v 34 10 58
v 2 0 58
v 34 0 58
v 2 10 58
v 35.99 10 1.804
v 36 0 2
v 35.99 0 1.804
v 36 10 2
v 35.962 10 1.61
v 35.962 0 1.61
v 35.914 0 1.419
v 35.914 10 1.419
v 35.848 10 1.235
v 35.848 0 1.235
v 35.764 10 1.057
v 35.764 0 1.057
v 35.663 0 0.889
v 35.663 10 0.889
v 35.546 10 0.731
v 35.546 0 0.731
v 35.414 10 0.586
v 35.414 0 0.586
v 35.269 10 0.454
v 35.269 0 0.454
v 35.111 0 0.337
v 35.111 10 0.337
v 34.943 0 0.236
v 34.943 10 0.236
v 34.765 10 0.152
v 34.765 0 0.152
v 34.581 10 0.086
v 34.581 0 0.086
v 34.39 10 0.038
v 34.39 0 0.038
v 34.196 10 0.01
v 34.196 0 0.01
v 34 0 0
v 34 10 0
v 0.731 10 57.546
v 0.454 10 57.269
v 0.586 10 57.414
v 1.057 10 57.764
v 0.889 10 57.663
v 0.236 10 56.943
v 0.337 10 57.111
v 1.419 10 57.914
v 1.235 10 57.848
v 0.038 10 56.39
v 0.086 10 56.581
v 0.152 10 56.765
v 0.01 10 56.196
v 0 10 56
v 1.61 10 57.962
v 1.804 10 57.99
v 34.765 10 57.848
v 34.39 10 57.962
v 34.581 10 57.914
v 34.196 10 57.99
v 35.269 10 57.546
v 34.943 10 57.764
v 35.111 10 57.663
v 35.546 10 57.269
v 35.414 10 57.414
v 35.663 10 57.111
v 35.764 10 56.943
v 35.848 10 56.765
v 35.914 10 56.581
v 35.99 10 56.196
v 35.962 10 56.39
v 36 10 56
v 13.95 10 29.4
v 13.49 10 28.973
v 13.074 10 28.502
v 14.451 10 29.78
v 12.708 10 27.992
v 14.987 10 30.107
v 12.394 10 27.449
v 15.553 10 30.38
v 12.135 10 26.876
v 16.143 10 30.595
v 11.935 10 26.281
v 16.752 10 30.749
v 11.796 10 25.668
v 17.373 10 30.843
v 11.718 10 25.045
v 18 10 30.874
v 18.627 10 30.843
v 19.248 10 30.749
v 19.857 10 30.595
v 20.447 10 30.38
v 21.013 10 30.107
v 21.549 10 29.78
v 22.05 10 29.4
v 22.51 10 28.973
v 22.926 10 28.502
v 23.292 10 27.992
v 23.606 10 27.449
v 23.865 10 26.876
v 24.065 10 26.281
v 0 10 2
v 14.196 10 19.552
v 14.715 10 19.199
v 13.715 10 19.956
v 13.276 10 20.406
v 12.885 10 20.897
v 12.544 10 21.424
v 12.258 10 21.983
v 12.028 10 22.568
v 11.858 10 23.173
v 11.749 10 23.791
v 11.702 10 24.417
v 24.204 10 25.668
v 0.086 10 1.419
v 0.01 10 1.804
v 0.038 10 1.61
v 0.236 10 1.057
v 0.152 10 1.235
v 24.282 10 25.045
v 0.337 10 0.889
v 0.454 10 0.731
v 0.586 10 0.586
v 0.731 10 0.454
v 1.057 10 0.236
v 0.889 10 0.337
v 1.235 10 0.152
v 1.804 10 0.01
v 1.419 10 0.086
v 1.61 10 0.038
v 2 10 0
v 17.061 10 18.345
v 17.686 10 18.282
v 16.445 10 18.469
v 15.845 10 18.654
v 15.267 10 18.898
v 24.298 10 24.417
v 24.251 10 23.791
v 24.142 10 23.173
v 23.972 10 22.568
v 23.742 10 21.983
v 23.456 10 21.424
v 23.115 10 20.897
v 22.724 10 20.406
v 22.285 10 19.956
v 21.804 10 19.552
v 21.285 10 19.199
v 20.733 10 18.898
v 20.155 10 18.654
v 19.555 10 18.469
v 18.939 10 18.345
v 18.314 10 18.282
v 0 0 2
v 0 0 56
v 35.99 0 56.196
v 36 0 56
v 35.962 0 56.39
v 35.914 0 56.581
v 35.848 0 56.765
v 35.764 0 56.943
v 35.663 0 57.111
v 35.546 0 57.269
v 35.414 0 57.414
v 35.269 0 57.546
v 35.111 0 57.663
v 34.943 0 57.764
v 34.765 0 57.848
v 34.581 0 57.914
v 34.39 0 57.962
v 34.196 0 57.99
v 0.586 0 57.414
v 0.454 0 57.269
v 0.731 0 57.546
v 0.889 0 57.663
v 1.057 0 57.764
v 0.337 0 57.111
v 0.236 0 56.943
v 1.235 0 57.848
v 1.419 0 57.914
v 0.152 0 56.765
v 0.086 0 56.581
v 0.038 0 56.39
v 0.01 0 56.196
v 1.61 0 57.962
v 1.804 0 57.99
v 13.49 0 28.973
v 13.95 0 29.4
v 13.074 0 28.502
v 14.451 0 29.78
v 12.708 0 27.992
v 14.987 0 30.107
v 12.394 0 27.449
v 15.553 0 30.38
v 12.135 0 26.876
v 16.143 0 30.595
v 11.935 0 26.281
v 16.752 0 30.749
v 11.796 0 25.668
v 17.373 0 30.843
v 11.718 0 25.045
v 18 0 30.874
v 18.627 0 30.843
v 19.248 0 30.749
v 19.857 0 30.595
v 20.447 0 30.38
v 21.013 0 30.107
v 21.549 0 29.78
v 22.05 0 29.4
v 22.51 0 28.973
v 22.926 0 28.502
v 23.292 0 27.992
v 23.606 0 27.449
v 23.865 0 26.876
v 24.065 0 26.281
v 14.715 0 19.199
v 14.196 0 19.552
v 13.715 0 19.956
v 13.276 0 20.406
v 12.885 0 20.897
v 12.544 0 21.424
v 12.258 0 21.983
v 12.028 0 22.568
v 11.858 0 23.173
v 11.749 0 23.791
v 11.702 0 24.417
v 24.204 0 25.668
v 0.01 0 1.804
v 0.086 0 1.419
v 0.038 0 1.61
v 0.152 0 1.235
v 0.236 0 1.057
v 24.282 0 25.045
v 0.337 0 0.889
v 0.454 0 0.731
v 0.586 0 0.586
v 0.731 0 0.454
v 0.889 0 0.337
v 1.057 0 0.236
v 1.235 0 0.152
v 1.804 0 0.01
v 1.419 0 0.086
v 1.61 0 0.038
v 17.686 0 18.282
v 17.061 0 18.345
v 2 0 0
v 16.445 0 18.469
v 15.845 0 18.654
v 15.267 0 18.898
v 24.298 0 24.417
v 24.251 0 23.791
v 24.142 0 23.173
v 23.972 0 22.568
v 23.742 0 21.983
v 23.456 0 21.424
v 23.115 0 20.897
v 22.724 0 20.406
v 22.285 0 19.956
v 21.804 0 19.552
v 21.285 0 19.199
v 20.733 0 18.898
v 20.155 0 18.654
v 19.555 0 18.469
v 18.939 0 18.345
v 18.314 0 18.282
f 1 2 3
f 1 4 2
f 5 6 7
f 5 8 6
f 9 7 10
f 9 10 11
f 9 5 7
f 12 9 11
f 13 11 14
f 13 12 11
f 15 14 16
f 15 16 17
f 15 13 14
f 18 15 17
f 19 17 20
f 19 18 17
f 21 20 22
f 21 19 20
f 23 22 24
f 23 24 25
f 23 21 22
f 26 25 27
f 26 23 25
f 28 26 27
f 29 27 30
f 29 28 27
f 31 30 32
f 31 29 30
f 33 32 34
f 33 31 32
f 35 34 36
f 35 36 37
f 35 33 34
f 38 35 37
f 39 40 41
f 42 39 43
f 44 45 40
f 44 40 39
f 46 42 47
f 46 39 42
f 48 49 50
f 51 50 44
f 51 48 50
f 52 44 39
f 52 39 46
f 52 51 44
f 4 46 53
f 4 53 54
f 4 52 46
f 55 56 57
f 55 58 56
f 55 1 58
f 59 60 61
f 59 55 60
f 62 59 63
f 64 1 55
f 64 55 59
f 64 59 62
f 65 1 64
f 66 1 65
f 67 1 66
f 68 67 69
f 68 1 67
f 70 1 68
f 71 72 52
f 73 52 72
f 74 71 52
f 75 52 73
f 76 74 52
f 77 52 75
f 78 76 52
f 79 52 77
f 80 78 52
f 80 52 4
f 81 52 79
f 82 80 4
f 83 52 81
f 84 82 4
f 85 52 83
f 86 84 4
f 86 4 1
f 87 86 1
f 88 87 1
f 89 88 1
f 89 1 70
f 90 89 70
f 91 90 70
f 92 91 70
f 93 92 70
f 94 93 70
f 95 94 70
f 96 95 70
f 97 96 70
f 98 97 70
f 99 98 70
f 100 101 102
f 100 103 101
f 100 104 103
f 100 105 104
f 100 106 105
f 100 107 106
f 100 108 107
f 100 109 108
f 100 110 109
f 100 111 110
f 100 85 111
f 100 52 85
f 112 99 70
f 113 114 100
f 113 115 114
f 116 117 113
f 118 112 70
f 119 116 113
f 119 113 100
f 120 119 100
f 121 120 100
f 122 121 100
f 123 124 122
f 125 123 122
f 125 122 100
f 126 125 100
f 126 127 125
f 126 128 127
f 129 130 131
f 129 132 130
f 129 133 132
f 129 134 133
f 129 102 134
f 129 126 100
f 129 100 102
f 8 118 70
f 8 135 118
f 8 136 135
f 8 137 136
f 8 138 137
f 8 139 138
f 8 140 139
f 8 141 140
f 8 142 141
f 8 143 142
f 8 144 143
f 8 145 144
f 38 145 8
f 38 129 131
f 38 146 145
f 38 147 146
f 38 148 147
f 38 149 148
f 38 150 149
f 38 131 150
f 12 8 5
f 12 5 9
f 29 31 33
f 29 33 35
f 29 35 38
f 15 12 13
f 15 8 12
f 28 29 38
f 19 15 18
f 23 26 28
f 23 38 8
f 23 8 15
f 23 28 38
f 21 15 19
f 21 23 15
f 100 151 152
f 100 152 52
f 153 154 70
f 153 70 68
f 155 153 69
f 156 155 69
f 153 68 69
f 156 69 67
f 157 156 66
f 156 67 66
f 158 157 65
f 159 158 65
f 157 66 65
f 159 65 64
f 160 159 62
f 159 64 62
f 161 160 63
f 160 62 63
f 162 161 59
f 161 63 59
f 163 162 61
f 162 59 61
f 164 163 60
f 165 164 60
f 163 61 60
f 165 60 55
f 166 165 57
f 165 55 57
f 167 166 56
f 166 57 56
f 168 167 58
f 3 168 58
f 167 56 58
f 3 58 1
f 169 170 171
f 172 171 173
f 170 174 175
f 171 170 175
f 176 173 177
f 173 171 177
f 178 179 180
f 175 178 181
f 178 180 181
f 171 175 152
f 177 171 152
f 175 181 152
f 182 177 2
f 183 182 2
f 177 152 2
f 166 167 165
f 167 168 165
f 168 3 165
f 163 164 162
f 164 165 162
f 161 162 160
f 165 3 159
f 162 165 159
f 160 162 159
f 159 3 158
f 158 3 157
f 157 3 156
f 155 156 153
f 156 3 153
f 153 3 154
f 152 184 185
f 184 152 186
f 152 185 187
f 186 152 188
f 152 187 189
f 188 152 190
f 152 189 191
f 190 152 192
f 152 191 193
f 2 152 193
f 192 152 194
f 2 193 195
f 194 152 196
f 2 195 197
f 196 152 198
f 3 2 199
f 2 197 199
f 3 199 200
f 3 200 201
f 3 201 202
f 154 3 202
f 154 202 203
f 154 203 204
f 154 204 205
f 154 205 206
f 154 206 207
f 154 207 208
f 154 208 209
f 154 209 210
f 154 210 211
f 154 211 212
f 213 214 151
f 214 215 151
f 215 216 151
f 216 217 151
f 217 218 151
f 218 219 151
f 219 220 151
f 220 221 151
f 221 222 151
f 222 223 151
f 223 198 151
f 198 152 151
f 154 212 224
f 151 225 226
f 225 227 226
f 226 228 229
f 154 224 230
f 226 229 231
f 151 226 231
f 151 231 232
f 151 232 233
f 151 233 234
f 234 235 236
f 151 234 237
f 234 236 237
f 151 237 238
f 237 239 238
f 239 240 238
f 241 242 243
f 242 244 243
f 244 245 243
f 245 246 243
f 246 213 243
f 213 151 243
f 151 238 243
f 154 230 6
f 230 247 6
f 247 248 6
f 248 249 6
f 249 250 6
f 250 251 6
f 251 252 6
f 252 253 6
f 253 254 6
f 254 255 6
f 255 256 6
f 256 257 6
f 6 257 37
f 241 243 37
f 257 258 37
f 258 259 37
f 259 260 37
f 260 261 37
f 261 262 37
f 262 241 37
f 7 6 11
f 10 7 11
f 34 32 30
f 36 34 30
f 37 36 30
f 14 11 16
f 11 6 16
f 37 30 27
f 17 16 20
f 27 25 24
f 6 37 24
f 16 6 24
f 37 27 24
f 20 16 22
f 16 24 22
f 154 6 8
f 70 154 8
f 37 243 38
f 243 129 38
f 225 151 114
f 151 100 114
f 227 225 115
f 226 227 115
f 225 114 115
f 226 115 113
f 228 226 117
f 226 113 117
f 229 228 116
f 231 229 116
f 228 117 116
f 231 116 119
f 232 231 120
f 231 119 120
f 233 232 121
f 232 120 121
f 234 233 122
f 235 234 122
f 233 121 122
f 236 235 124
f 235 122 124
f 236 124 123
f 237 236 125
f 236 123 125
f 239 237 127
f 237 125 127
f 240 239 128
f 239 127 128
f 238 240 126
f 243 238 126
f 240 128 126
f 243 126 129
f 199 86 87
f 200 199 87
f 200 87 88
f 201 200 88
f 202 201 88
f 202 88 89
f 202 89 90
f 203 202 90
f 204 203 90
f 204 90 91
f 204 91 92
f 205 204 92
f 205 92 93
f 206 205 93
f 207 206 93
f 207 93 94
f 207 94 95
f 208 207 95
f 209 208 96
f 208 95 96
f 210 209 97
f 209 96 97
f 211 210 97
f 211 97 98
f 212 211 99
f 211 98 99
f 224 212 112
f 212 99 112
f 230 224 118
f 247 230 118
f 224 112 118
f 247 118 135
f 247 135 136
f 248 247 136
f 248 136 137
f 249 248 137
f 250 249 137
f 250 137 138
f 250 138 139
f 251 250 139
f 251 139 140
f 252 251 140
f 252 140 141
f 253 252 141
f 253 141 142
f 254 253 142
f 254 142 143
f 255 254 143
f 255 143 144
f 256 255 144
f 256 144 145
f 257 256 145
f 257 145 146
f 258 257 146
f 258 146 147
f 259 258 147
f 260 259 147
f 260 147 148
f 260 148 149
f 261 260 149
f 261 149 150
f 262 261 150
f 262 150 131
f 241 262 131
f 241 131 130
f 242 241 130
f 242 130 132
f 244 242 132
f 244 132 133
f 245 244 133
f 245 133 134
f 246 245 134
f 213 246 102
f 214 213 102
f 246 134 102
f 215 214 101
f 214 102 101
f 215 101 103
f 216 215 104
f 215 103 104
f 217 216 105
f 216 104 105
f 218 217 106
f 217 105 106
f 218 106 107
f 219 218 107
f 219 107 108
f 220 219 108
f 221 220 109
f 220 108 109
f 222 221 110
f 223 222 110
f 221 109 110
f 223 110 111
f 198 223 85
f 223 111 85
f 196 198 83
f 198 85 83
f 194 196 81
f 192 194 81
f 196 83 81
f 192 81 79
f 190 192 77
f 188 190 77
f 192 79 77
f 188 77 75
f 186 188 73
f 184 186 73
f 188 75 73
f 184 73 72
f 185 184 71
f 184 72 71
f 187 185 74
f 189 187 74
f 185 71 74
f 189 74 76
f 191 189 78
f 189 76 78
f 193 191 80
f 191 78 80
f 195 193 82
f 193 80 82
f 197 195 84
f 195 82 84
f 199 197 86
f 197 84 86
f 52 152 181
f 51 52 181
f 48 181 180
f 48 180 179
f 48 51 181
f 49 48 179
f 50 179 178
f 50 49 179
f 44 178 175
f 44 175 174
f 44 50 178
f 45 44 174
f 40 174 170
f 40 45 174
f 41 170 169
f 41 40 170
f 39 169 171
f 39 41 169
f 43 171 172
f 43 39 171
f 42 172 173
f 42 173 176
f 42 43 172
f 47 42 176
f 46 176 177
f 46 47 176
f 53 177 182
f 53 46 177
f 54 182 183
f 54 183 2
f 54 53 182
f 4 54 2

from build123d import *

# Parameters (mm, degrees)
SKETCH_1_W                = 36
SKETCH_1_H                = 10
BLOCKEXTRUDE_DEPTH        = 58
FILLET_2_R                = 2
SKETCH_2_R                = 6.3
DRIVE_SHAFT_PASSAGE_DEPTH = 69.992753243


with BuildPart() as part:
    # 草图1 → BlockExtrude (new body)
    with BuildSketch(Plane.XY):
        with Locations((18, 5)):
            Rectangle(SKETCH_1_W, SKETCH_1_H)
    extrude(amount=BLOCKEXTRUDE_DEPTH)

    # Fillet 2
    fillet_2_edges = [part.edges().sort_by_distance(p)[0] for p in [
        (36, 5, 58),
        (0, 5, 58),
        (36, 5, 0),
        (0, 5, 0),
    ]]
    fillet(fillet_2_edges, radius=FILLET_2_R)

    # 草图2 → Drive_shaft_passage (cut, through all)
    with BuildSketch(Plane(origin=(0, 10, 0), x_dir=(1, 0, 0), z_dir=(0, 1, 0))):
        with Locations(Location((18, -24.5744, 0), (0, 0, 270))):
            Circle(SKETCH_2_R)
    extrude(amount=-DRIVE_SHAFT_PASSAGE_DEPTH, mode=Mode.SUBTRACT)


solid = part.part
